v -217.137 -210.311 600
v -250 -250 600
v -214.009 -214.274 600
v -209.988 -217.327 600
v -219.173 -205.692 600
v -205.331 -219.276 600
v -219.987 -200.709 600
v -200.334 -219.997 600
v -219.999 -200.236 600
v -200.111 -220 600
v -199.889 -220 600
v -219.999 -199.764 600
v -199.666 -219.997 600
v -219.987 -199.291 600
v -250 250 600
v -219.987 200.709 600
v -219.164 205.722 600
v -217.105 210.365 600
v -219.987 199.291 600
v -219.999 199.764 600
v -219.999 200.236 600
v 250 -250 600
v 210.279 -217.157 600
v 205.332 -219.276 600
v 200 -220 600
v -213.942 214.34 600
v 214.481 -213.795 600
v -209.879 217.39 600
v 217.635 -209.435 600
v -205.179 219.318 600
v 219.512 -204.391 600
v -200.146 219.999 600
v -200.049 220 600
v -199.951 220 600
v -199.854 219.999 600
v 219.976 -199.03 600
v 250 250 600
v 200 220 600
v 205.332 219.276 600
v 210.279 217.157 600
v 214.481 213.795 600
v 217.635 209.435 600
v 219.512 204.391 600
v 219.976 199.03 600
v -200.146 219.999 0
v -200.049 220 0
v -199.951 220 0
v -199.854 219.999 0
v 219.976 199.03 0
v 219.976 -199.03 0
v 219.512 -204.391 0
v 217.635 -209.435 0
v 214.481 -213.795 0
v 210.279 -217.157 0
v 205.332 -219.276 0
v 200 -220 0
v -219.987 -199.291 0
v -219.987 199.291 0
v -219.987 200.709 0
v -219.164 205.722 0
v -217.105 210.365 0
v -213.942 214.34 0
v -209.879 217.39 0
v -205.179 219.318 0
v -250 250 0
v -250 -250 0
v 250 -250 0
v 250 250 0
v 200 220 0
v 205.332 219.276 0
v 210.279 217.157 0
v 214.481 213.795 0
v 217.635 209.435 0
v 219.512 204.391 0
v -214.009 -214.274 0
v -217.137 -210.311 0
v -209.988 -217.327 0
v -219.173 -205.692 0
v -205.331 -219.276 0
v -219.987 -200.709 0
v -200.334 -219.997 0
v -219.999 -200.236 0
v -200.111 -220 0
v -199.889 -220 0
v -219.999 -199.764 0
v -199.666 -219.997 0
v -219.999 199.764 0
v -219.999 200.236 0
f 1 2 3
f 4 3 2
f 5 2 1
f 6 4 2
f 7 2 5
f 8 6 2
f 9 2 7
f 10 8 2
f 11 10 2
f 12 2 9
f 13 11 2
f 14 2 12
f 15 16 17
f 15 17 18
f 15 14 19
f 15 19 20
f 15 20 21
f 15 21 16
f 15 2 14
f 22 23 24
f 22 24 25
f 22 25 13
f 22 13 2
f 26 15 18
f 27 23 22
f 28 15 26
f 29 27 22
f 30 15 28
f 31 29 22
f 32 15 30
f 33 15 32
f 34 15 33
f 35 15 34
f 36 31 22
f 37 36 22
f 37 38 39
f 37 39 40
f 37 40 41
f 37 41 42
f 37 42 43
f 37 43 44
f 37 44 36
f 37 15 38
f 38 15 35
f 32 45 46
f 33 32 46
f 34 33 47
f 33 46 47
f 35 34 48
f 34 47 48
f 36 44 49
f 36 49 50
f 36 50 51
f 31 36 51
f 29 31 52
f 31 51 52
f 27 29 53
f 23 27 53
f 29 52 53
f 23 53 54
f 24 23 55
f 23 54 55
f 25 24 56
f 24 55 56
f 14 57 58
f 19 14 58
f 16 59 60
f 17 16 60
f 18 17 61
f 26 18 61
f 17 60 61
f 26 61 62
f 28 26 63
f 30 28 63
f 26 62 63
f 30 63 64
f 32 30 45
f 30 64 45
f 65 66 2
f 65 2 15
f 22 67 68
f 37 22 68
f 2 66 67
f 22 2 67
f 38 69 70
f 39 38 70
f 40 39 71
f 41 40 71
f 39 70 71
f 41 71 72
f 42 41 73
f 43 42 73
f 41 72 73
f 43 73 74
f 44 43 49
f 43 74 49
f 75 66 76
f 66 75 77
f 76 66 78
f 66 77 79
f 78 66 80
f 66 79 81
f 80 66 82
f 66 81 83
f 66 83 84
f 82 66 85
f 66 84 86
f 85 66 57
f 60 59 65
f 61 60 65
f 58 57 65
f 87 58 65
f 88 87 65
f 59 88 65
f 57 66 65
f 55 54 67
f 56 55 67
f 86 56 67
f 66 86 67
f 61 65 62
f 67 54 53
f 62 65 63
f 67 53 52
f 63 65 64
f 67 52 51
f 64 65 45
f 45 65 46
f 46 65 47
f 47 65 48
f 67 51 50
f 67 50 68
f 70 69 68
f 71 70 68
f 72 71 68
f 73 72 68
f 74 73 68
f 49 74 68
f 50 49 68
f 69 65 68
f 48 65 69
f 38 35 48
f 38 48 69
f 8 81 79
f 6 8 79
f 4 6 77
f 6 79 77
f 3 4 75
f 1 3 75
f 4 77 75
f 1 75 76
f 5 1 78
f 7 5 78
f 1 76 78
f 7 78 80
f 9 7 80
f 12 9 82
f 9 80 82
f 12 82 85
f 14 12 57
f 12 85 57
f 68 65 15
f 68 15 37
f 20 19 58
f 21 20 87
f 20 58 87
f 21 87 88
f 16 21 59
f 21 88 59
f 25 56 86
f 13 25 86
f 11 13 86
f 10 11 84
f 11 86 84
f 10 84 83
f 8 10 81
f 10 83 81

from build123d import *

# Parameters (mm, degrees)
F0_W     = 500
F0_H     = 500
F1_DEPTH = 600


with BuildPart() as f1:
    # F0 (on Top) → F1 (new body)
    with BuildSketch(Plane.XY):
        Rectangle(F0_W, F0_H)
        with BuildLine():
            ThreePointArc((-200.145707391, 219.9994692269), (-200.000026529, 220), (-199.8543456655, 219.9994696133))
            Line((-199.8543456655, 219.9994696133), (199.999973471, 220))
            ThreePointArc((199.999973471, 220), (214.4809440479, 213.7950084988), (219.9764733348, 199.0301994505))
            Line((219.9764733348, 199.0301994505), (219.9764733348, -199.0301994505))
            ThreePointArc((219.9764733348, -199.0301994505), (214.480905162, -213.7950493181), (199.9998607178, -219.9999999995))
            Line((199.9998607178, -219.9999999995), (-199.6663459368, -219.9972166805))
            ThreePointArc((-199.6663459368, -219.9972166805), (-200.0001392822, -219.9999999995), (-200.3339325887, -219.9972120313))
            ThreePointArc((-200.3339325887, -219.9972120313), (-214.0088543508, -214.2741724726), (-219.9874282617, -200.7090214974))
            ThreePointArc((-219.9874282617, -200.7090214974), (-220, -200), (-219.9874282617, -199.2909785026))
            Line((-219.9874282617, -199.2909785026), (-219.9874282617, 199.2909785026))
            ThreePointArc((-219.9874282617, 199.2909785026), (-220, 200), (-219.9874282617, 200.7090214974))
            ThreePointArc((-219.9874282617, 200.7090214974), (-213.941525426, 214.3399396371), (-200.145707391, 219.9994692269))
        make_face(mode=Mode.SUBTRACT)
    extrude(amount=F1_DEPTH)


solid = f1.part
